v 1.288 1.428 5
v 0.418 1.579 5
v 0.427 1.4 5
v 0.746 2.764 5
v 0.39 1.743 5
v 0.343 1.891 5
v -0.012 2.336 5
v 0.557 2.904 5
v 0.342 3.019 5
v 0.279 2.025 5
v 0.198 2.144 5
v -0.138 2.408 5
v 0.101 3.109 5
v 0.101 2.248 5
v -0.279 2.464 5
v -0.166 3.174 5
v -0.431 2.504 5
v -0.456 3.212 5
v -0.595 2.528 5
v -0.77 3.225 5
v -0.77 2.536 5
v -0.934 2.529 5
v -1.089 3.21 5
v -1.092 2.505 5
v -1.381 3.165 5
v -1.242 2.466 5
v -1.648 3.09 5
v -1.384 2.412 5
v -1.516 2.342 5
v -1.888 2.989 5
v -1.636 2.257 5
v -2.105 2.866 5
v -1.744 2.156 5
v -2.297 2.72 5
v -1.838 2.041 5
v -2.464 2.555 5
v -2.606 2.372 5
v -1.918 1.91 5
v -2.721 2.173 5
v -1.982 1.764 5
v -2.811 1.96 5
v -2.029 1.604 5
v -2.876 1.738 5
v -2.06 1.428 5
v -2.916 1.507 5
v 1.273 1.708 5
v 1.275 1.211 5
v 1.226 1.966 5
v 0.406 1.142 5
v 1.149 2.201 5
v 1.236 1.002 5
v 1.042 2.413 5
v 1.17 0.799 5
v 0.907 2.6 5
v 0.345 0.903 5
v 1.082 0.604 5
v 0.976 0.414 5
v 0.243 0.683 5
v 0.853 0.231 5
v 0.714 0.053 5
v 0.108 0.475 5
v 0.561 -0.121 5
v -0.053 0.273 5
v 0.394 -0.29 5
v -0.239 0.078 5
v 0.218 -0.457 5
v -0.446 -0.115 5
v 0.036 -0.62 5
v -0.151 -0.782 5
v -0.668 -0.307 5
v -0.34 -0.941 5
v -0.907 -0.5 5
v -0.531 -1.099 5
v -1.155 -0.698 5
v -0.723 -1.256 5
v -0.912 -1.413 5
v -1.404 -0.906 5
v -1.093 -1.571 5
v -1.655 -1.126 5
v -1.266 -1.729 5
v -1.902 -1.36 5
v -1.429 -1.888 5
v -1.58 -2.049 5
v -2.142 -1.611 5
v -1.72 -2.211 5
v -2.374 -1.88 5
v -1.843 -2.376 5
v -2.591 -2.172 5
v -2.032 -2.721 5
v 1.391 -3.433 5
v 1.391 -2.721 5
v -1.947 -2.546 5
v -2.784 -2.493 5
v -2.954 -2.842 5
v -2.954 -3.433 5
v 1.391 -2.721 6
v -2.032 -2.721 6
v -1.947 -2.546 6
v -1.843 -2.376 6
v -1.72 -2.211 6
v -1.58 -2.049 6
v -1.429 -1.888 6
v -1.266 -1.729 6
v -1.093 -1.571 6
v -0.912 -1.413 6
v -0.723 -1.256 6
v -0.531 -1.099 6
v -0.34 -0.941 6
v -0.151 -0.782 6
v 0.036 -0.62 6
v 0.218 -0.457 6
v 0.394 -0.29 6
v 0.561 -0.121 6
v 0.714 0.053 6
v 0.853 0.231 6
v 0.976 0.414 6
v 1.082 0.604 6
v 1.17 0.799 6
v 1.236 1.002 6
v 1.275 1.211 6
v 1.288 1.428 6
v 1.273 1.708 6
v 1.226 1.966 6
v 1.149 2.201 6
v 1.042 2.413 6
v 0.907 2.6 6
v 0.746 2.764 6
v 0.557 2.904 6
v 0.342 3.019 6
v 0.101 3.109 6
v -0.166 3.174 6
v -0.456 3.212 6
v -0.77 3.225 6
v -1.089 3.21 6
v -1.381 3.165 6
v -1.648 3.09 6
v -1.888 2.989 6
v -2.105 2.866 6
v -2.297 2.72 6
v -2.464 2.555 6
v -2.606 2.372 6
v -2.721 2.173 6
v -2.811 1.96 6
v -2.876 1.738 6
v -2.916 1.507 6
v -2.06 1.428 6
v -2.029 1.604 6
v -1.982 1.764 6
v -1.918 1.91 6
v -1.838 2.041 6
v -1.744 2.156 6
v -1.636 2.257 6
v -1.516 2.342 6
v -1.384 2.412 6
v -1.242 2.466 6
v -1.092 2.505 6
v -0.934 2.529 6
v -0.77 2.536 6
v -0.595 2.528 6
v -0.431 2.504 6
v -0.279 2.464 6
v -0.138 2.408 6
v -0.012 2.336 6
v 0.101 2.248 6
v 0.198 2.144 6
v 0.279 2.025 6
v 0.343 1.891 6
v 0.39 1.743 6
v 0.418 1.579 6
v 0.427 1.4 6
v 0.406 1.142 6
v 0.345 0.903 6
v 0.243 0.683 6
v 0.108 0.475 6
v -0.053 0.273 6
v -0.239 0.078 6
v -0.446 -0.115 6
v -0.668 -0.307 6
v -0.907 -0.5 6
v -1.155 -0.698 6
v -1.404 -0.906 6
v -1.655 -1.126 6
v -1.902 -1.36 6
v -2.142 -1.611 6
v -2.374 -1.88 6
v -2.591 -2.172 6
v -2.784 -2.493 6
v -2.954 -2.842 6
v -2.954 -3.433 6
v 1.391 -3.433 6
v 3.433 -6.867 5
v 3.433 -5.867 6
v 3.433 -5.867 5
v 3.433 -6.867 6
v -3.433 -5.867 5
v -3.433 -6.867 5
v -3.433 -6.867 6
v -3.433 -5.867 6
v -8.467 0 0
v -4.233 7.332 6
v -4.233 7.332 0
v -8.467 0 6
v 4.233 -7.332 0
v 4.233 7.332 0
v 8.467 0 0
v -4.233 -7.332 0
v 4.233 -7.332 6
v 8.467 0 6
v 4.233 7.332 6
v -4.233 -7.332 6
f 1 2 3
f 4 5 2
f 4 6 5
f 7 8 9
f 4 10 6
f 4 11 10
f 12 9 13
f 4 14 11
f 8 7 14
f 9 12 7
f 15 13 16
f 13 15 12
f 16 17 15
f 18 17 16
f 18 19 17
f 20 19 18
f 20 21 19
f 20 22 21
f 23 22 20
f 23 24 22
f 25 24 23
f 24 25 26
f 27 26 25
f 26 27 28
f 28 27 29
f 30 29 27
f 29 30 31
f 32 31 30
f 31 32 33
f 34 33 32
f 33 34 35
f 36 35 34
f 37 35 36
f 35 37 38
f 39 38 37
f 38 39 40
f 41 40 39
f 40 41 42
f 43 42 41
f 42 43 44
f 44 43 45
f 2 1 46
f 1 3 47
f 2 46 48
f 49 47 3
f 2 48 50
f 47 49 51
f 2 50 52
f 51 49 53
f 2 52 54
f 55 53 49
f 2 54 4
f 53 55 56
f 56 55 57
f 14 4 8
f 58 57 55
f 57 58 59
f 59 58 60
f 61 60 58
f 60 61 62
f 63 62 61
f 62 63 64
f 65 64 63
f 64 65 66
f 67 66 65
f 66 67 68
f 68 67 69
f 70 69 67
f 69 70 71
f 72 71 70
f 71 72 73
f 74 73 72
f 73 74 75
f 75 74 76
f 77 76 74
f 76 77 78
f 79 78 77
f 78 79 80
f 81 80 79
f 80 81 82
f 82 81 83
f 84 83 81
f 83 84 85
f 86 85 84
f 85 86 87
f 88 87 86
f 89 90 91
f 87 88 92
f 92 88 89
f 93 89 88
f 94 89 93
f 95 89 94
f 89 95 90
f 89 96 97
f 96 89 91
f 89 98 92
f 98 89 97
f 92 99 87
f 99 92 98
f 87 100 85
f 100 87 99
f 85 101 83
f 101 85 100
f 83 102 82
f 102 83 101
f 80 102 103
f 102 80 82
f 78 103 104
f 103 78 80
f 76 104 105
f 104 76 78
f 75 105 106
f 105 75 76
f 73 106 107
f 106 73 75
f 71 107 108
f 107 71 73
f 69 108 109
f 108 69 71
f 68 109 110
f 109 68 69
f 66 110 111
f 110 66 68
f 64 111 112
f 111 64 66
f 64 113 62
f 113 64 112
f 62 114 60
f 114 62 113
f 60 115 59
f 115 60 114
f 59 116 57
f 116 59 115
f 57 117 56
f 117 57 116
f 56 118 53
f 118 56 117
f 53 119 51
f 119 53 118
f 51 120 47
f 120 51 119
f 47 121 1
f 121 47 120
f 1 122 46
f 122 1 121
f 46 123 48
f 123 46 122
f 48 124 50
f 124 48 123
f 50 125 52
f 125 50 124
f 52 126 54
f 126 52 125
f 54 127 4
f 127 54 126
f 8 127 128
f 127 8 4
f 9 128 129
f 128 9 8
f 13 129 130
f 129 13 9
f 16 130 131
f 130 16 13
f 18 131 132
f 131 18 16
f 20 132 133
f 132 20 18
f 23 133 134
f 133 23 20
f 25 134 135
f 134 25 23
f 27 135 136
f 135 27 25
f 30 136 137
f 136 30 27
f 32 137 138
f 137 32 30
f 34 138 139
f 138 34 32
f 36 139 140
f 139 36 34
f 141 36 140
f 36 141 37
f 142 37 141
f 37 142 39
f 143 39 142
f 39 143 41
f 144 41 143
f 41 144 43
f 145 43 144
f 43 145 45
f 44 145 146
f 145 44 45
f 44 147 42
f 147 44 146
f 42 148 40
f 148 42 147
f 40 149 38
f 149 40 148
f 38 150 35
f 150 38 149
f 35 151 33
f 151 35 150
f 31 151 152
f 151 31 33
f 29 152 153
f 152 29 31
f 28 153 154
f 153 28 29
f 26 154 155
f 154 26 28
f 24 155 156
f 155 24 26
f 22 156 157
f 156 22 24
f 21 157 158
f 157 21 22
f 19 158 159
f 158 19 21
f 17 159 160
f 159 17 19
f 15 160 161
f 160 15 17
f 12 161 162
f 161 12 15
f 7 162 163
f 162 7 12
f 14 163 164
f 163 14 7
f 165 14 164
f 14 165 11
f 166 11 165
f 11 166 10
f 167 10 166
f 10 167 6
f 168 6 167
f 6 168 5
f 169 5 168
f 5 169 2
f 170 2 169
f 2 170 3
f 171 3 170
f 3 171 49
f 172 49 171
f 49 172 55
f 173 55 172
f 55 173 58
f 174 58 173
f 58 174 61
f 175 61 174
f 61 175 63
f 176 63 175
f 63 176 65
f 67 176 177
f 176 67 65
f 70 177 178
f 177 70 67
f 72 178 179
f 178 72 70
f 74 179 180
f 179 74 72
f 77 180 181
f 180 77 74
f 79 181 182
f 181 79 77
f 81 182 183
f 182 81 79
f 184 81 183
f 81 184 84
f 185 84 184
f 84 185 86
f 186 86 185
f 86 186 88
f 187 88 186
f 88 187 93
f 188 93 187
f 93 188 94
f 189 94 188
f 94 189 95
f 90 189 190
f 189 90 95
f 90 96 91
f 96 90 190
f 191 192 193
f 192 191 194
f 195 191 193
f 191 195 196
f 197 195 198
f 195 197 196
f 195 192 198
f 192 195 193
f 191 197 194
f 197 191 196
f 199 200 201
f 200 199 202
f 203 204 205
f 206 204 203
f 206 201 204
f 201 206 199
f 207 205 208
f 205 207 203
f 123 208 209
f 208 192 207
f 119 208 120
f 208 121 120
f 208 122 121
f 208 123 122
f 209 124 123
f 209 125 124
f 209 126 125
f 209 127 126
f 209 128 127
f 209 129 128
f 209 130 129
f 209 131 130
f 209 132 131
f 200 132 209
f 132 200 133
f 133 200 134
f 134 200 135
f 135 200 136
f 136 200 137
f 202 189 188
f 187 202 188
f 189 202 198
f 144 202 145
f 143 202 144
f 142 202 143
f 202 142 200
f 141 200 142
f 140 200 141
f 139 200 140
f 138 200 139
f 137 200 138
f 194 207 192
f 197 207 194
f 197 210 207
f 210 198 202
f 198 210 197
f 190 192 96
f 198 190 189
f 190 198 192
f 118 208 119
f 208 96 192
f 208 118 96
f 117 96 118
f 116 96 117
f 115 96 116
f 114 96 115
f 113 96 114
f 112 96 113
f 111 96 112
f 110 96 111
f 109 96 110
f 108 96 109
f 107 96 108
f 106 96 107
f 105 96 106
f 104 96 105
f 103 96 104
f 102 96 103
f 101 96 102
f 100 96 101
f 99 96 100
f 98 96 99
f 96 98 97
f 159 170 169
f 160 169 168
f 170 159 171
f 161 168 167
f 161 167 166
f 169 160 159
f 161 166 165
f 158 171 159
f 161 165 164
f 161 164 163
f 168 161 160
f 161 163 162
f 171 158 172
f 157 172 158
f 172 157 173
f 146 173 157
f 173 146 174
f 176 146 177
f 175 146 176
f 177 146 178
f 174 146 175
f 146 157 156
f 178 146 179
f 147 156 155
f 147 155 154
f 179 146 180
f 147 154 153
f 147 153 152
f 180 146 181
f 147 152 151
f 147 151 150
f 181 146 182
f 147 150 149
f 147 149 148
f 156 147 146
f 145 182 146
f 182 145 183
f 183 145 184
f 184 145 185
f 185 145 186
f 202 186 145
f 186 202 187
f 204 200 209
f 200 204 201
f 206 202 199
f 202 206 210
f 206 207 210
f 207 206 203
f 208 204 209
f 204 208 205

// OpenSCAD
// file: ../library/calculate.scad
module inlay(depth)
{
    difference()
    {
        children(0);
        translate([ 0, 0, depth ]) children([1:$children - 1]);
    }
}
// file: ../library/variables.scad
// Variables

die_width = 12;
double_digit_placement = 1; // 0.7 for 8mm, 1 for 12mm

wiggle_width = 0.2;
separator = 1.6;
base_plate_sides = 5;
token_sides = 6;
slot_height = 1;

// Calculations

height = die_width / 2;

die_slot_width = die_width + wiggle_width;
die_slot_y = -1 * ((die_slot_width / 2) + separator);
die_slot_right_x = (die_slot_width / 2) + separator;
die_slot_left_x = -1 * (die_slot_width / 2) - separator;

base_plate_size = (die_slot_width * 2) + separator;
inset_width = base_plate_size - separator;
inset_depth = height - separator;

shallow_slot_height = (height - inset_depth) / 2;

token_slot_width = base_plate_size / 3;
token_width = token_slot_width - wiggle_width;
token_height = height;
token_slot_y = (die_slot_width / 2) + (separator * 2);
token_inset_height = token_height - 1;
token_doubledigit_font_size = token_width - separator;

token_poison_width = (token_width / 3);
token_poison_placement = (token_width / 3);
// file: ../library/tokens.scad
include <variables.scad>
include <calculate.scad>

module token_base()
{
    linear_extrude(token_height) circle(token_width, $fn = token_sides);
}

module token_doubledigit_number(num) 
{
    inlay(depth = token_inset_height) 
    {
        token_base();
        translate([-1 * token_doubledigit_font_size + double_digit_placement, -1 * token_doubledigit_font_size / 2, 0]) linear_extrude(token_height) text(text = num, size = token_doubledigit_font_size);
        translate([-1 * token_doubledigit_font_size / 2, -1 * token_doubledigit_font_size, 0]) cube([token_doubledigit_font_size, 1, 2]);
    }
}

module token_singledigit_number(num) 
{ 
    inlay(depth = token_inset_height) 
    {
        token_base();
        translate([-1 * (token_doubledigit_font_size / 2), -1 * token_doubledigit_font_size / 2, 0]) linear_extrude(token_height) text(text = num, size = token_doubledigit_font_size);
        translate([-1 * token_doubledigit_font_size / 2, -1 * token_doubledigit_font_size, 0]) cube([token_doubledigit_font_size, 1, 2]);
    }
}
// main file
include <../library/tokens.scad>

token_singledigit_number("2");
